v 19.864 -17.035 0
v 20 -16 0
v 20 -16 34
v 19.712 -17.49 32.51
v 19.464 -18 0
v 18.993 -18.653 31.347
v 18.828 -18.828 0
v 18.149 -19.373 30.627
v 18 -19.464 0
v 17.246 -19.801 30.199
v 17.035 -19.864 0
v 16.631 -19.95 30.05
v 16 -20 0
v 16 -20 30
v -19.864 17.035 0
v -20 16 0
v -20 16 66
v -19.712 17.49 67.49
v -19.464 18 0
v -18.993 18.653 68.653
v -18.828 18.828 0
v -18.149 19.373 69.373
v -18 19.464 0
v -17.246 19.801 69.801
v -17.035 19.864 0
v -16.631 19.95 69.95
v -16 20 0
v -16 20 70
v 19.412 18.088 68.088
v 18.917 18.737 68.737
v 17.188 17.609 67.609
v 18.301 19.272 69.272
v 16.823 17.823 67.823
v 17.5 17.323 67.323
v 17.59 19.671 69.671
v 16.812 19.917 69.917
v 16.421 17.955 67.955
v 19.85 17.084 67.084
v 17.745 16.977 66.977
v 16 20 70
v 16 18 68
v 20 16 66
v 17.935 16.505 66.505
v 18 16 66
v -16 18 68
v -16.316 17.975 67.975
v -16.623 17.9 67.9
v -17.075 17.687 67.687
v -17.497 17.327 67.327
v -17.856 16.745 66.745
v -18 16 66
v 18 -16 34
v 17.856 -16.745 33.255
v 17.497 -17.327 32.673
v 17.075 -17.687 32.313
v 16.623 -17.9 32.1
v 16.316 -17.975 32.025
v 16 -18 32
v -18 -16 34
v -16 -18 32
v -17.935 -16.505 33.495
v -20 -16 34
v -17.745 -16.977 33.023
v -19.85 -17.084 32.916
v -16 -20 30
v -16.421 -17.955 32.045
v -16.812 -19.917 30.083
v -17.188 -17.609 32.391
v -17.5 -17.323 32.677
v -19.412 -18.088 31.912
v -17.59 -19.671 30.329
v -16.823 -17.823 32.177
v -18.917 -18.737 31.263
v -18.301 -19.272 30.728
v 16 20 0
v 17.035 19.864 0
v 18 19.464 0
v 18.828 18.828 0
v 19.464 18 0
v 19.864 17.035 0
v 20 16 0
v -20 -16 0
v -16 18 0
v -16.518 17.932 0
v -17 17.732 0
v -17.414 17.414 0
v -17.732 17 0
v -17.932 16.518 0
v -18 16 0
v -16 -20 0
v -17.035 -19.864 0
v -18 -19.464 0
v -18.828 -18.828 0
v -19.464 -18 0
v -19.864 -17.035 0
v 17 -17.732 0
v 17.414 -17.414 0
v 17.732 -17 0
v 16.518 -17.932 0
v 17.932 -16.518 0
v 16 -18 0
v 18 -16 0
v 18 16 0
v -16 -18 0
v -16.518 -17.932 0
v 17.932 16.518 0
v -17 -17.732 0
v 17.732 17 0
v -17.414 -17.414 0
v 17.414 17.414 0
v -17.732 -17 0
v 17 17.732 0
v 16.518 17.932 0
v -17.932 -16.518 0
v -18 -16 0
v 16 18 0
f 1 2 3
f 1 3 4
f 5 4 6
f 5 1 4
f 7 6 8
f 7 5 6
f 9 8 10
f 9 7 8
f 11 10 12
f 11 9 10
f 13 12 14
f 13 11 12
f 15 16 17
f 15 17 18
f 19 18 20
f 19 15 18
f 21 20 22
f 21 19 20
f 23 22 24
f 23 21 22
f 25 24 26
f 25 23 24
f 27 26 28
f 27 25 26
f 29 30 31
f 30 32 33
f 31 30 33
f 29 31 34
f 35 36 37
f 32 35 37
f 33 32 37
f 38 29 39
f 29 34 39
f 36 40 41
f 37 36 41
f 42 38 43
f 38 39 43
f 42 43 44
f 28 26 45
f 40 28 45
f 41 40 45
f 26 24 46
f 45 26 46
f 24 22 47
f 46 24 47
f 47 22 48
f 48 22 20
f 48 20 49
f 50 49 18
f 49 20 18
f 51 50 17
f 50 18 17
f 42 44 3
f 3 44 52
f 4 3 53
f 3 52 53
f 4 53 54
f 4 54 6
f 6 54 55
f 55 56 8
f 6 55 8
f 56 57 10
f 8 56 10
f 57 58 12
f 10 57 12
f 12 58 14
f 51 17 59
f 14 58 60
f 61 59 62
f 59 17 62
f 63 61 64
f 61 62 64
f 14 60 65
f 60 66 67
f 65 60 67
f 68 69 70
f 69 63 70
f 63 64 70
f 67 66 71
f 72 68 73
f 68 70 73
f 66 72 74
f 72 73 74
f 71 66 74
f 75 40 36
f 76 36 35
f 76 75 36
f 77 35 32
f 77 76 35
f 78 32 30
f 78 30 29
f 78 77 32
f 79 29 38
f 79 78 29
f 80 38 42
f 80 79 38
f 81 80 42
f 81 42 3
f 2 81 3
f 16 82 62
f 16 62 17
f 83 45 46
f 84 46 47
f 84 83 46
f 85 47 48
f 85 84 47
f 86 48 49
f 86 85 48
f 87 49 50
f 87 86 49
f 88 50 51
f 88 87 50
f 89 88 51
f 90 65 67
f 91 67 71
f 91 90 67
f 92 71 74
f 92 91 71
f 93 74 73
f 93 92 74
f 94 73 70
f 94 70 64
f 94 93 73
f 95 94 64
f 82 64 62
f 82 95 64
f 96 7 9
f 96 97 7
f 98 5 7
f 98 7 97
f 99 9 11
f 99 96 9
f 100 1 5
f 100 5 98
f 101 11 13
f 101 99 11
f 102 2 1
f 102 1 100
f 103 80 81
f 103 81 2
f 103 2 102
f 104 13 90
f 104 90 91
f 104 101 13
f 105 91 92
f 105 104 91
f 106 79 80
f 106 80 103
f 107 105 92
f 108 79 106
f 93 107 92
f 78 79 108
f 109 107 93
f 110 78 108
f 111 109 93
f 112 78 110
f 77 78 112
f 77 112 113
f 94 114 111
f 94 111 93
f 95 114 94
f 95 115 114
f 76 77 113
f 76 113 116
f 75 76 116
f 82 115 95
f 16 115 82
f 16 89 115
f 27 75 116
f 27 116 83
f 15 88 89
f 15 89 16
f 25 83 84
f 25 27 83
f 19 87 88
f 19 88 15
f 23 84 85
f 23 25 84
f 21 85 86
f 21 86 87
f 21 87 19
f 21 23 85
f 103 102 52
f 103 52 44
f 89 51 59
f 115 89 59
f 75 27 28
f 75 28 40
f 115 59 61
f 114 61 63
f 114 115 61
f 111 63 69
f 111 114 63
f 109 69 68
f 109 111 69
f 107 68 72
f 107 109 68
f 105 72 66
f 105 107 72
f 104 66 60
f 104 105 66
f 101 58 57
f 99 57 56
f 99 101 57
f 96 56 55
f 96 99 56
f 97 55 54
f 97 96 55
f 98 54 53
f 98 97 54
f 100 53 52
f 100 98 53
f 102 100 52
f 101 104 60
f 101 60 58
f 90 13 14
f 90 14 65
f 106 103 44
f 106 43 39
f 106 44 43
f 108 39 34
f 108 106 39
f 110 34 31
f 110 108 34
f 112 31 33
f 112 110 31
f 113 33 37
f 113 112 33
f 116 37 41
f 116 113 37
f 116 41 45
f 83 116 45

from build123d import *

# Parameters (mm, degrees)
Y_KSEKLIK_EKSTR_ZYON1_DEPTH = 70
KES_EKSTR_ZYON1_DEPTH       = 41
KES_EKSTR_ZYON1_DEPTH_BACK  = 43


with BuildPart() as part:
    # Çizim1 → Yükseklik-Ekstrüzyon1 (new body)
    with BuildSketch(Plane.XY):
        with BuildLine():
            Line((-16, 20), (16, 20))
            ThreePointArc((16, 20), (18.828427125, 18.828427125), (20, 16))
            Line((20, 16), (20, -16))
            ThreePointArc((20, -16), (18.828427125, -18.828427125), (16, -20))
            Line((16, -20), (-16, -20))
            ThreePointArc((-16, -20), (-18.828427125, -18.828427125), (-20, -16))
            Line((-20, -16), (-20, 16))
            ThreePointArc((-20, 16), (-18.828427125, 18.828427125), (-16, 20))
        make_face()
        with BuildLine():
            Line((-18, 16), (-18, -16))
            ThreePointArc((-18, -16), (-17.414213562, -17.414213562), (-16, -18))
            Line((-16, -18), (16, -18))
            ThreePointArc((16, -18), (17.414213562, -17.414213562), (18, -16))
            Line((18, -16), (18, 16))
            ThreePointArc((18, 16), (17.414213562, 17.414213562), (16, 18))
            Line((16, 18), (-16, 18))
            ThreePointArc((-16, 18), (-17.414213562, 17.414213562), (-18, 16))
        make_face(mode=Mode.SUBTRACT)
    extrude(amount=Y_KSEKLIK_EKSTR_ZYON1_DEPTH)

    # Çizim3 → Kes-Ekstrüzyon1 (cut, two sides: drawn at the far end of the back side and taken through both)
    with BuildSketch(Plane(origin=(0, 0, 0), x_dir=(0, 0, -1), z_dir=(1, 0, 0)).offset(-KES_EKSTR_ZYON1_DEPTH_BACK)):
        Polygon((-70, 20), (-30, -20), (-70, -20), align=None)
    extrude(amount=KES_EKSTR_ZYON1_DEPTH + KES_EKSTR_ZYON1_DEPTH_BACK, mode=Mode.SUBTRACT)


solid = part.part
